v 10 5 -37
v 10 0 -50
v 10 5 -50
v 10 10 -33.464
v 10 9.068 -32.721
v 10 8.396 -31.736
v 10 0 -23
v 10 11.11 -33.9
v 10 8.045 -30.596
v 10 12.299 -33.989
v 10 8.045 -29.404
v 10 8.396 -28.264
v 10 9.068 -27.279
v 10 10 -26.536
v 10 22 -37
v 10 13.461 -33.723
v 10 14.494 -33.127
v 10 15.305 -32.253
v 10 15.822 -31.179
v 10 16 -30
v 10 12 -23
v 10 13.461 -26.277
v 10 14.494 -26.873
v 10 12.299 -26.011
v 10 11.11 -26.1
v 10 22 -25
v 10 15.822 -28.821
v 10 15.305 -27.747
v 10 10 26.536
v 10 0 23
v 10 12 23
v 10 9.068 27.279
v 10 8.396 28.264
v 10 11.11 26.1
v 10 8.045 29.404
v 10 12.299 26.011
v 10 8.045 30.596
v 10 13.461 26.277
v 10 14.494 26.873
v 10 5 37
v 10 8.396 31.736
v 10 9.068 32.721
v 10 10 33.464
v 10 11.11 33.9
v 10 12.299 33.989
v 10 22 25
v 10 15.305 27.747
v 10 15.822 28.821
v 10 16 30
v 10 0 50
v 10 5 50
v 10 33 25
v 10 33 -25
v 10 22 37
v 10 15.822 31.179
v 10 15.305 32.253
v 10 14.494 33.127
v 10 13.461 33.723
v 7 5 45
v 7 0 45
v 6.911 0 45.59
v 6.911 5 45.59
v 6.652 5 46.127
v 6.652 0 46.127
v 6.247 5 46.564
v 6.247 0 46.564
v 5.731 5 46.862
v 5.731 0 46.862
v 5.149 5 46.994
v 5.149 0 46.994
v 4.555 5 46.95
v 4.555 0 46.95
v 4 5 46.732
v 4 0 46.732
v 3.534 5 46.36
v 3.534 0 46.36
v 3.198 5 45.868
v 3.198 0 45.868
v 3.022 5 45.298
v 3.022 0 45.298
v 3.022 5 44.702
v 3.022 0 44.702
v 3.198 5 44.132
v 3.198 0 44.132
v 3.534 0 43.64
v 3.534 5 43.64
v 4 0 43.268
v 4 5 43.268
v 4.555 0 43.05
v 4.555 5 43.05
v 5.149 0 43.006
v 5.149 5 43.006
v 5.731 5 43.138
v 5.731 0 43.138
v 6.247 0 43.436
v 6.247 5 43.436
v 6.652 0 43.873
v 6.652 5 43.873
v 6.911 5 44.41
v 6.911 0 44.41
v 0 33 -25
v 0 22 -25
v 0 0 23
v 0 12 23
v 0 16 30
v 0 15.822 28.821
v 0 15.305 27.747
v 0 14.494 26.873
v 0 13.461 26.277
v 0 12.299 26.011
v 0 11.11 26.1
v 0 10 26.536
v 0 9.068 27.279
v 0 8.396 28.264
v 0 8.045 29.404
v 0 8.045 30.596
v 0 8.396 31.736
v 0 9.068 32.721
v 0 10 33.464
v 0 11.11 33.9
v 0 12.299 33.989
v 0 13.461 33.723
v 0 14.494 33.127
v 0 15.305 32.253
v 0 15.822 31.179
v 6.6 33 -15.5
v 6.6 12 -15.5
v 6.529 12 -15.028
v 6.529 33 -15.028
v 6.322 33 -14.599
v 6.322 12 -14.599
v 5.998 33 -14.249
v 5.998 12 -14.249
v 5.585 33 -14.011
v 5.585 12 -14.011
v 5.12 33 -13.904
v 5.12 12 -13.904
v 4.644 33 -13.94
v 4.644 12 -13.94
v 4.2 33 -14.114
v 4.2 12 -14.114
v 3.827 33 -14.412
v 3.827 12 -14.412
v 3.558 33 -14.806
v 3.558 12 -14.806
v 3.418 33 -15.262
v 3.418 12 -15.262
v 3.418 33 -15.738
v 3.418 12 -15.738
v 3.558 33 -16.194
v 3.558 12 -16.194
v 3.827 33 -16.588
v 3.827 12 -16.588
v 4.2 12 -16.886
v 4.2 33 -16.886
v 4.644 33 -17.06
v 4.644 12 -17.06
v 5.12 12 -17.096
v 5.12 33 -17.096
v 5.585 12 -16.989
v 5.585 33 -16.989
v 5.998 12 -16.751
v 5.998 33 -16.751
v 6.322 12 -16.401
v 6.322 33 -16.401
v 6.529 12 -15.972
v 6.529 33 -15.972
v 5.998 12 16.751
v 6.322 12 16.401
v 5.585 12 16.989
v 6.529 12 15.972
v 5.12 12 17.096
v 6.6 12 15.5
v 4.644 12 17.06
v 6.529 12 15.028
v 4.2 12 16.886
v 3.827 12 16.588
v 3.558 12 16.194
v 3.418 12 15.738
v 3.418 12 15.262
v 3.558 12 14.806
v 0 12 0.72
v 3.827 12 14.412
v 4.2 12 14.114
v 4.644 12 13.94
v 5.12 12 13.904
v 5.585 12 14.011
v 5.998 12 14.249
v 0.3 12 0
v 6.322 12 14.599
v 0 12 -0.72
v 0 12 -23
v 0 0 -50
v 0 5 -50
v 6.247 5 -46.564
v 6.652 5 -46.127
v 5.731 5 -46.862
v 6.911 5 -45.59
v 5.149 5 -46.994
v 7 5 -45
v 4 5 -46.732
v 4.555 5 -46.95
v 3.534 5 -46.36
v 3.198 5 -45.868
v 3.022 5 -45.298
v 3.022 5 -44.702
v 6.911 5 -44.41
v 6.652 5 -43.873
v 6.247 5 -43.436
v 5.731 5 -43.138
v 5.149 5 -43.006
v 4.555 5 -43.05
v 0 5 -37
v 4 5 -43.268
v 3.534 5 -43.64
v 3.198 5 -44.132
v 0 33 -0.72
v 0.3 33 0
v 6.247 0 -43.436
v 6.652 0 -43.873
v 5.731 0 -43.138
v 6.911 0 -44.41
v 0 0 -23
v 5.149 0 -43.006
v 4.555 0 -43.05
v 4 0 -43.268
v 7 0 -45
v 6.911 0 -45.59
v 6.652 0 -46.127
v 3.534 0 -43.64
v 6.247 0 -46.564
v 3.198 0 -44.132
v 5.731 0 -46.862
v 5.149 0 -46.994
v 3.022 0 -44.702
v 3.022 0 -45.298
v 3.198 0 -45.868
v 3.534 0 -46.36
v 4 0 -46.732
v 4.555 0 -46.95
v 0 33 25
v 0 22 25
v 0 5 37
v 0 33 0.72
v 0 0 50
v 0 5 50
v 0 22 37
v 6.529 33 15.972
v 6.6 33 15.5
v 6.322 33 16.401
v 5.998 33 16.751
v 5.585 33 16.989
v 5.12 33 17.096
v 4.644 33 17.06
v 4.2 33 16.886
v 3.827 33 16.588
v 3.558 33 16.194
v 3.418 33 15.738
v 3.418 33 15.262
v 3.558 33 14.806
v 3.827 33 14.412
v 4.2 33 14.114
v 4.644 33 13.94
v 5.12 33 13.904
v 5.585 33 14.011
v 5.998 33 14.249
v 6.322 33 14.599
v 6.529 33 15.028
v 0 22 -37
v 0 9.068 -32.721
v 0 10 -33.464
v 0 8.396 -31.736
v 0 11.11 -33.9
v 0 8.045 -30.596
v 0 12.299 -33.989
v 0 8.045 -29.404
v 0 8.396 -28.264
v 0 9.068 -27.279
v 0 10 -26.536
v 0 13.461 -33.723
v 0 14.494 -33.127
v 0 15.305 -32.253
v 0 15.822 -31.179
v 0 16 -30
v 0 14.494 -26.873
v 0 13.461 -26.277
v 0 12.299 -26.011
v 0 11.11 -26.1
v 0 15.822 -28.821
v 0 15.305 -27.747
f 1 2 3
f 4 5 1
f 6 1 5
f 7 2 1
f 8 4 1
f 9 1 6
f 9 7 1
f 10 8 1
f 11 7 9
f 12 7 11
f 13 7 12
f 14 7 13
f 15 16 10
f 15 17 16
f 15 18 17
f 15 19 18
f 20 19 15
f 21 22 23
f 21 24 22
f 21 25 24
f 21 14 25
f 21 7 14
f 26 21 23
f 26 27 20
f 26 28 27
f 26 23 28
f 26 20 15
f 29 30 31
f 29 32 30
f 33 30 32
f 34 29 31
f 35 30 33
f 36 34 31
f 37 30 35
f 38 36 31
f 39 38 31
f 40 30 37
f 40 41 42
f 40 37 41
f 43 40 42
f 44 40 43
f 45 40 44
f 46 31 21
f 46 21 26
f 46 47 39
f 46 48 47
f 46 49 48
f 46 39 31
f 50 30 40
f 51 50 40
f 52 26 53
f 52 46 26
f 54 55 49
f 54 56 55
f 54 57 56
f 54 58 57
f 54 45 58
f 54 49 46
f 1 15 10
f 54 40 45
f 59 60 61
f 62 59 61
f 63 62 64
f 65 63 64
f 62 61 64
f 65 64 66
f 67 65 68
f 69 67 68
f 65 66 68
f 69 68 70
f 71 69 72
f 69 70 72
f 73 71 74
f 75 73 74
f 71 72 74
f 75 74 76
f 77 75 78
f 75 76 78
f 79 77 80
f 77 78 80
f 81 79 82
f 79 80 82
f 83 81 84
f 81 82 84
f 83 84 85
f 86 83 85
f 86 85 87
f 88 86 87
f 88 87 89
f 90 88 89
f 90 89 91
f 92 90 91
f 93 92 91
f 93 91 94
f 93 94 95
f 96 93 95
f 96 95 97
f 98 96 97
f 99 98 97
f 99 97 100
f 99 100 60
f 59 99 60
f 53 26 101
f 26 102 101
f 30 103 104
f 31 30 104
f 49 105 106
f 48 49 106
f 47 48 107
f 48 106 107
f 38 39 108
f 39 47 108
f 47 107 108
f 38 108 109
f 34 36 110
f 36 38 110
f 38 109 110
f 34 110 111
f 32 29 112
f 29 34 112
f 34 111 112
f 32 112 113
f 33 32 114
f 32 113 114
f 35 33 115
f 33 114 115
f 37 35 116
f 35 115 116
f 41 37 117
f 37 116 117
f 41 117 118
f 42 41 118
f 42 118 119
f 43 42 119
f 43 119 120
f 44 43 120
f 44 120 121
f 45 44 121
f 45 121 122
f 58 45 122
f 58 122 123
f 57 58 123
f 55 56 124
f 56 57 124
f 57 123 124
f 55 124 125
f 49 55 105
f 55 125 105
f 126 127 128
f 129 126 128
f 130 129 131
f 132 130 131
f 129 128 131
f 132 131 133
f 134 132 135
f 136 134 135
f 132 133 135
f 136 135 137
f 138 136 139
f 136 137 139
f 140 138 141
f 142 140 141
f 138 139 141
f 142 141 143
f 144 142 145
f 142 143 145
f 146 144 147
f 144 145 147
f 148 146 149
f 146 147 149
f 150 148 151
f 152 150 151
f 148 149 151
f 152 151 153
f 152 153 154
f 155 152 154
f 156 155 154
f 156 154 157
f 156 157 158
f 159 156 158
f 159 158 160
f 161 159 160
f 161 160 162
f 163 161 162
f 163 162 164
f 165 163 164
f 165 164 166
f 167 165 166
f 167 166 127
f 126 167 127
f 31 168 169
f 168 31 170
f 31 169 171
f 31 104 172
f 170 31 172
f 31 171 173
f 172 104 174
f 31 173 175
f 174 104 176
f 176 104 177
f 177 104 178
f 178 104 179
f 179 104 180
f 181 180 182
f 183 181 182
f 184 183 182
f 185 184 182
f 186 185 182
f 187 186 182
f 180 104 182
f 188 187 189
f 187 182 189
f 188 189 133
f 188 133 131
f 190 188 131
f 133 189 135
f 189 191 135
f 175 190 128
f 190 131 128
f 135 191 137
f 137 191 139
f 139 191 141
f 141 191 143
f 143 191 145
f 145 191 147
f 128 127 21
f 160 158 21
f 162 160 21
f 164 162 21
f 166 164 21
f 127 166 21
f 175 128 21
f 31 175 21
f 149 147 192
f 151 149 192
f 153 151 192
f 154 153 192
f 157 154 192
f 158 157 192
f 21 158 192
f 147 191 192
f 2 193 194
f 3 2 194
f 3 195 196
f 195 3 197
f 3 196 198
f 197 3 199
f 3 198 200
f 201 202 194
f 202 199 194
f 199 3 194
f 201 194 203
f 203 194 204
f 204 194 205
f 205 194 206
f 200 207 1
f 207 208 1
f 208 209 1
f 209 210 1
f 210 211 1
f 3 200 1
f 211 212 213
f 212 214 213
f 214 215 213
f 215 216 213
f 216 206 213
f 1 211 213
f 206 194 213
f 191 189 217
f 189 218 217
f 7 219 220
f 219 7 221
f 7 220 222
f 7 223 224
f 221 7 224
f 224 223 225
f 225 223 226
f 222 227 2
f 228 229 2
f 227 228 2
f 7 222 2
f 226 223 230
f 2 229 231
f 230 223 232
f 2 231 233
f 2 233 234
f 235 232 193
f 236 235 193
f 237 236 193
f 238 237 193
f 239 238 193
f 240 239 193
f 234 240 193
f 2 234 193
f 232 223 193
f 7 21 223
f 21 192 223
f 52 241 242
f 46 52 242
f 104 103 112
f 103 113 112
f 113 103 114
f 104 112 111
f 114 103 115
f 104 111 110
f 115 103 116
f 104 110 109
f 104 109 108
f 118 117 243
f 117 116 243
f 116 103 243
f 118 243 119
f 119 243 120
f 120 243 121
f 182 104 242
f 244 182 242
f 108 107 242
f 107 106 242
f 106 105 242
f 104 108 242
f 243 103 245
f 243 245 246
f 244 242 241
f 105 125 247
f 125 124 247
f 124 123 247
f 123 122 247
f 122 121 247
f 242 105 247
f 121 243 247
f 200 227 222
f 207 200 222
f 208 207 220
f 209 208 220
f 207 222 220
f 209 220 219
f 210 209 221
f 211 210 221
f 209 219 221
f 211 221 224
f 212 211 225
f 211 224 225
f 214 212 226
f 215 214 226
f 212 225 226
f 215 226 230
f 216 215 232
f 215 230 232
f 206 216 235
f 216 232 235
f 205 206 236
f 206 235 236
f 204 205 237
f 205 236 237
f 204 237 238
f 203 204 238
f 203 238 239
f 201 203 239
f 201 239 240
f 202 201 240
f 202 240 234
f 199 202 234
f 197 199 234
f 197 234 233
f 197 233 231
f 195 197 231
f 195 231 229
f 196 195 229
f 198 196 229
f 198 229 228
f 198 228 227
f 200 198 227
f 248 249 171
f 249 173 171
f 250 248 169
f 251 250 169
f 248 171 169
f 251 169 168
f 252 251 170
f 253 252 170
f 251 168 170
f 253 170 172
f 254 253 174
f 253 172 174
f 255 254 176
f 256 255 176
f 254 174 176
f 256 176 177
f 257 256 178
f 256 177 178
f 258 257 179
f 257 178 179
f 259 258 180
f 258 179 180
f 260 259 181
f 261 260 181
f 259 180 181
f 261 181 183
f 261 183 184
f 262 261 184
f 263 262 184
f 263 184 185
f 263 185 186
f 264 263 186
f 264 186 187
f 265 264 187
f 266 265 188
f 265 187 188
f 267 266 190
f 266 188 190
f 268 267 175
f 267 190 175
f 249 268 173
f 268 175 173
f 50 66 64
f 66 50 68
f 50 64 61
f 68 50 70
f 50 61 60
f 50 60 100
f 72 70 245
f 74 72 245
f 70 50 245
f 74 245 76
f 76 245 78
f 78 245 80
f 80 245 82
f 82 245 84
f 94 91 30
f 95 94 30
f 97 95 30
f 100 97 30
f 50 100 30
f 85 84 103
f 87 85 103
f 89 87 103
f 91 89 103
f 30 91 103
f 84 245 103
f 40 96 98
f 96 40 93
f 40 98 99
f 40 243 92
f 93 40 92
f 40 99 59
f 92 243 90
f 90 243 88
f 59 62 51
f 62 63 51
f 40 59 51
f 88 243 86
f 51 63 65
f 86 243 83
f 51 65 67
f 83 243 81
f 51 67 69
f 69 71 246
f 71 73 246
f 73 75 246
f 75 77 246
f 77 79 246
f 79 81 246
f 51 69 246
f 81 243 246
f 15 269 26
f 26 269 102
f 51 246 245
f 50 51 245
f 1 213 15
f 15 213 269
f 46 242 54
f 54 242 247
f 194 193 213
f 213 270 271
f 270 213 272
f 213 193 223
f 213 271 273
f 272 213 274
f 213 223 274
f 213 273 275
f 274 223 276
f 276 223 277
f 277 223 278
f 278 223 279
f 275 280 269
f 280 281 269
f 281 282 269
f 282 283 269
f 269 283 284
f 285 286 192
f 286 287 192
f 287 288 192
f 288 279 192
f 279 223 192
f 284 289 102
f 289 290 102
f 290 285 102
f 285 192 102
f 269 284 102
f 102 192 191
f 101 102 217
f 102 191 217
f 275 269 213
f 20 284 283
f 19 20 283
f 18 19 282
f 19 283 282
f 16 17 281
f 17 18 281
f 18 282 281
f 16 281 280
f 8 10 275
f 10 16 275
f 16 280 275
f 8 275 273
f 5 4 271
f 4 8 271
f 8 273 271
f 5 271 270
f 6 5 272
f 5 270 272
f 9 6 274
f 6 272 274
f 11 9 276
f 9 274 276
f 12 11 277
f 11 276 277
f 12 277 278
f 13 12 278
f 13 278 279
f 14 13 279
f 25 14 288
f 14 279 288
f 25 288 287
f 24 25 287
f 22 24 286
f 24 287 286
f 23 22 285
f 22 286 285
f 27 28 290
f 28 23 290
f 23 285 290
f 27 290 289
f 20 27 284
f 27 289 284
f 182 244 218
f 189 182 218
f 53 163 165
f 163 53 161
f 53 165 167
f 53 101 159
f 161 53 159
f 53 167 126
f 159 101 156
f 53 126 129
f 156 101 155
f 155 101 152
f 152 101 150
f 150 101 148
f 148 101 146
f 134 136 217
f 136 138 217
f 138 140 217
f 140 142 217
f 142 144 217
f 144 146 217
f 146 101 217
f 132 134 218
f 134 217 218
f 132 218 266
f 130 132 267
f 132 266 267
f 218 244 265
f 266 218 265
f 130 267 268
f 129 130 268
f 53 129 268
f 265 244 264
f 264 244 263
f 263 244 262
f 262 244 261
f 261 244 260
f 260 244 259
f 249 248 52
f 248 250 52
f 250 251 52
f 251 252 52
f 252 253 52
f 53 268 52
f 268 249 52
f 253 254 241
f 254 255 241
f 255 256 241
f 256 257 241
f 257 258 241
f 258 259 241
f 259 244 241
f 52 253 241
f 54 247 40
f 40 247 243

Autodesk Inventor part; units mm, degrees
ref_plane "YZ Plane" through (0, 0, 0) normal (1, 0, 0) x (0, 1, 0)
ref_plane "XZ Plane" through (0, 0, 0) normal (0, 1, 0) x (-1, 0, 0)
ref_plane "XY Plane" through (0, 0, 0) normal (0, 0, 1) x (1, 0, 0)
sketch "Sketch1" plane through (0, 0, 0) normal (1, 0, 0) x (0, 1, 0)
  line L0 (0, 50) -> (0, 23)
  line L1 (0, 23) -> (12, 23)
  line L2 (12, 23) -> (12, -23)
  line L3 (12, -23) -> (0, -23)
  line L4 (0, -23) -> (0, -50)
  line L5 (0, -50) -> (5, -50)
  line L6 (5, -50) -> (5, -37)
  line L7 (5, -37) -> (22, -37)
  line L8 (22, -37) -> (22, -25)
  line L9 (22, -25) -> (33, -25)
  line L10 (33, -25) -> (33, 25)
  line L11 (33, 25) -> (22, 25)
  line L12 (22, 25) -> (22, 37)
  line L13 (22, 37) -> (5, 37)
  line L14 (5, 37) -> (5, 50)
  line L15 (5, 50) -> (0, 50)
  circle A0 centre (12, 30) radius 4
  circle A1 centre (12, -30) radius 4
  point P0 (0, 0)
  point P1 (12, 0)
  dimension "d0" = 100
  dimension "d1" = 46
  dimension "d2" = 27
  dimension "d3" = 5
  dimension "d4" = 17
  dimension "d5" = 13
  dimension "d6" = 12
  dimension "d7" = 11
  dimension "d8" = 12
  dimension "d9" = 8
  dimension "d10" = 30
  dimension "d11" = 30
  dimension "d12" = 12
extrude "Extrusion1" add sketch "Sketch1" along normal blind 10
sketch "Sketch2" plane through (0, 0, 23) normal (0, -1, 0) x (1, 0, 0)
  circle A0 centre (5, 22) radius 2
  circle A1 centre (5, -7.5) radius 1.6
  circle A2 centre (5, -38.5) radius 1.6
  circle A3 centre (5, -68) radius 2
  line L0 (0, 27) -> (10, 27) projected
  point P0 (0, -23)
  point P1 (5, 27)
  dimension "d15" = 4
  dimension "d16" = 3.2
  dimension "d17" = 15.5
  dimension "d18" = 15.5
  dimension "d19" = 90
  dimension "d20" = 45
extrude "Extrusion2" cut sketch "Sketch2" against normal through all
sketch "Sketch3" plane through (0, 33, 25) normal (0, 1, 0) x (1, 0, 0)
  line L0 (0.3, 25) -> (0, 25.72)
  line L1 (0, 50) -> (0, 0) projected
  line L2 (0, 24.28) -> (0.3, 25)
  point P0 (0, 25)
  point P1 (0, 25)
  dimension "d23" = 0.72
  dimension "d24" = 0.3
  dimension "d25" = 0.72
extrude "Extrusion3" cut sketch "Sketch3" against normal up to next
equation "\"d11\" = d10"
equation "\"d18\" = d17"
equation "\"d21\" = d18"
properties material "ABS Plastic"
